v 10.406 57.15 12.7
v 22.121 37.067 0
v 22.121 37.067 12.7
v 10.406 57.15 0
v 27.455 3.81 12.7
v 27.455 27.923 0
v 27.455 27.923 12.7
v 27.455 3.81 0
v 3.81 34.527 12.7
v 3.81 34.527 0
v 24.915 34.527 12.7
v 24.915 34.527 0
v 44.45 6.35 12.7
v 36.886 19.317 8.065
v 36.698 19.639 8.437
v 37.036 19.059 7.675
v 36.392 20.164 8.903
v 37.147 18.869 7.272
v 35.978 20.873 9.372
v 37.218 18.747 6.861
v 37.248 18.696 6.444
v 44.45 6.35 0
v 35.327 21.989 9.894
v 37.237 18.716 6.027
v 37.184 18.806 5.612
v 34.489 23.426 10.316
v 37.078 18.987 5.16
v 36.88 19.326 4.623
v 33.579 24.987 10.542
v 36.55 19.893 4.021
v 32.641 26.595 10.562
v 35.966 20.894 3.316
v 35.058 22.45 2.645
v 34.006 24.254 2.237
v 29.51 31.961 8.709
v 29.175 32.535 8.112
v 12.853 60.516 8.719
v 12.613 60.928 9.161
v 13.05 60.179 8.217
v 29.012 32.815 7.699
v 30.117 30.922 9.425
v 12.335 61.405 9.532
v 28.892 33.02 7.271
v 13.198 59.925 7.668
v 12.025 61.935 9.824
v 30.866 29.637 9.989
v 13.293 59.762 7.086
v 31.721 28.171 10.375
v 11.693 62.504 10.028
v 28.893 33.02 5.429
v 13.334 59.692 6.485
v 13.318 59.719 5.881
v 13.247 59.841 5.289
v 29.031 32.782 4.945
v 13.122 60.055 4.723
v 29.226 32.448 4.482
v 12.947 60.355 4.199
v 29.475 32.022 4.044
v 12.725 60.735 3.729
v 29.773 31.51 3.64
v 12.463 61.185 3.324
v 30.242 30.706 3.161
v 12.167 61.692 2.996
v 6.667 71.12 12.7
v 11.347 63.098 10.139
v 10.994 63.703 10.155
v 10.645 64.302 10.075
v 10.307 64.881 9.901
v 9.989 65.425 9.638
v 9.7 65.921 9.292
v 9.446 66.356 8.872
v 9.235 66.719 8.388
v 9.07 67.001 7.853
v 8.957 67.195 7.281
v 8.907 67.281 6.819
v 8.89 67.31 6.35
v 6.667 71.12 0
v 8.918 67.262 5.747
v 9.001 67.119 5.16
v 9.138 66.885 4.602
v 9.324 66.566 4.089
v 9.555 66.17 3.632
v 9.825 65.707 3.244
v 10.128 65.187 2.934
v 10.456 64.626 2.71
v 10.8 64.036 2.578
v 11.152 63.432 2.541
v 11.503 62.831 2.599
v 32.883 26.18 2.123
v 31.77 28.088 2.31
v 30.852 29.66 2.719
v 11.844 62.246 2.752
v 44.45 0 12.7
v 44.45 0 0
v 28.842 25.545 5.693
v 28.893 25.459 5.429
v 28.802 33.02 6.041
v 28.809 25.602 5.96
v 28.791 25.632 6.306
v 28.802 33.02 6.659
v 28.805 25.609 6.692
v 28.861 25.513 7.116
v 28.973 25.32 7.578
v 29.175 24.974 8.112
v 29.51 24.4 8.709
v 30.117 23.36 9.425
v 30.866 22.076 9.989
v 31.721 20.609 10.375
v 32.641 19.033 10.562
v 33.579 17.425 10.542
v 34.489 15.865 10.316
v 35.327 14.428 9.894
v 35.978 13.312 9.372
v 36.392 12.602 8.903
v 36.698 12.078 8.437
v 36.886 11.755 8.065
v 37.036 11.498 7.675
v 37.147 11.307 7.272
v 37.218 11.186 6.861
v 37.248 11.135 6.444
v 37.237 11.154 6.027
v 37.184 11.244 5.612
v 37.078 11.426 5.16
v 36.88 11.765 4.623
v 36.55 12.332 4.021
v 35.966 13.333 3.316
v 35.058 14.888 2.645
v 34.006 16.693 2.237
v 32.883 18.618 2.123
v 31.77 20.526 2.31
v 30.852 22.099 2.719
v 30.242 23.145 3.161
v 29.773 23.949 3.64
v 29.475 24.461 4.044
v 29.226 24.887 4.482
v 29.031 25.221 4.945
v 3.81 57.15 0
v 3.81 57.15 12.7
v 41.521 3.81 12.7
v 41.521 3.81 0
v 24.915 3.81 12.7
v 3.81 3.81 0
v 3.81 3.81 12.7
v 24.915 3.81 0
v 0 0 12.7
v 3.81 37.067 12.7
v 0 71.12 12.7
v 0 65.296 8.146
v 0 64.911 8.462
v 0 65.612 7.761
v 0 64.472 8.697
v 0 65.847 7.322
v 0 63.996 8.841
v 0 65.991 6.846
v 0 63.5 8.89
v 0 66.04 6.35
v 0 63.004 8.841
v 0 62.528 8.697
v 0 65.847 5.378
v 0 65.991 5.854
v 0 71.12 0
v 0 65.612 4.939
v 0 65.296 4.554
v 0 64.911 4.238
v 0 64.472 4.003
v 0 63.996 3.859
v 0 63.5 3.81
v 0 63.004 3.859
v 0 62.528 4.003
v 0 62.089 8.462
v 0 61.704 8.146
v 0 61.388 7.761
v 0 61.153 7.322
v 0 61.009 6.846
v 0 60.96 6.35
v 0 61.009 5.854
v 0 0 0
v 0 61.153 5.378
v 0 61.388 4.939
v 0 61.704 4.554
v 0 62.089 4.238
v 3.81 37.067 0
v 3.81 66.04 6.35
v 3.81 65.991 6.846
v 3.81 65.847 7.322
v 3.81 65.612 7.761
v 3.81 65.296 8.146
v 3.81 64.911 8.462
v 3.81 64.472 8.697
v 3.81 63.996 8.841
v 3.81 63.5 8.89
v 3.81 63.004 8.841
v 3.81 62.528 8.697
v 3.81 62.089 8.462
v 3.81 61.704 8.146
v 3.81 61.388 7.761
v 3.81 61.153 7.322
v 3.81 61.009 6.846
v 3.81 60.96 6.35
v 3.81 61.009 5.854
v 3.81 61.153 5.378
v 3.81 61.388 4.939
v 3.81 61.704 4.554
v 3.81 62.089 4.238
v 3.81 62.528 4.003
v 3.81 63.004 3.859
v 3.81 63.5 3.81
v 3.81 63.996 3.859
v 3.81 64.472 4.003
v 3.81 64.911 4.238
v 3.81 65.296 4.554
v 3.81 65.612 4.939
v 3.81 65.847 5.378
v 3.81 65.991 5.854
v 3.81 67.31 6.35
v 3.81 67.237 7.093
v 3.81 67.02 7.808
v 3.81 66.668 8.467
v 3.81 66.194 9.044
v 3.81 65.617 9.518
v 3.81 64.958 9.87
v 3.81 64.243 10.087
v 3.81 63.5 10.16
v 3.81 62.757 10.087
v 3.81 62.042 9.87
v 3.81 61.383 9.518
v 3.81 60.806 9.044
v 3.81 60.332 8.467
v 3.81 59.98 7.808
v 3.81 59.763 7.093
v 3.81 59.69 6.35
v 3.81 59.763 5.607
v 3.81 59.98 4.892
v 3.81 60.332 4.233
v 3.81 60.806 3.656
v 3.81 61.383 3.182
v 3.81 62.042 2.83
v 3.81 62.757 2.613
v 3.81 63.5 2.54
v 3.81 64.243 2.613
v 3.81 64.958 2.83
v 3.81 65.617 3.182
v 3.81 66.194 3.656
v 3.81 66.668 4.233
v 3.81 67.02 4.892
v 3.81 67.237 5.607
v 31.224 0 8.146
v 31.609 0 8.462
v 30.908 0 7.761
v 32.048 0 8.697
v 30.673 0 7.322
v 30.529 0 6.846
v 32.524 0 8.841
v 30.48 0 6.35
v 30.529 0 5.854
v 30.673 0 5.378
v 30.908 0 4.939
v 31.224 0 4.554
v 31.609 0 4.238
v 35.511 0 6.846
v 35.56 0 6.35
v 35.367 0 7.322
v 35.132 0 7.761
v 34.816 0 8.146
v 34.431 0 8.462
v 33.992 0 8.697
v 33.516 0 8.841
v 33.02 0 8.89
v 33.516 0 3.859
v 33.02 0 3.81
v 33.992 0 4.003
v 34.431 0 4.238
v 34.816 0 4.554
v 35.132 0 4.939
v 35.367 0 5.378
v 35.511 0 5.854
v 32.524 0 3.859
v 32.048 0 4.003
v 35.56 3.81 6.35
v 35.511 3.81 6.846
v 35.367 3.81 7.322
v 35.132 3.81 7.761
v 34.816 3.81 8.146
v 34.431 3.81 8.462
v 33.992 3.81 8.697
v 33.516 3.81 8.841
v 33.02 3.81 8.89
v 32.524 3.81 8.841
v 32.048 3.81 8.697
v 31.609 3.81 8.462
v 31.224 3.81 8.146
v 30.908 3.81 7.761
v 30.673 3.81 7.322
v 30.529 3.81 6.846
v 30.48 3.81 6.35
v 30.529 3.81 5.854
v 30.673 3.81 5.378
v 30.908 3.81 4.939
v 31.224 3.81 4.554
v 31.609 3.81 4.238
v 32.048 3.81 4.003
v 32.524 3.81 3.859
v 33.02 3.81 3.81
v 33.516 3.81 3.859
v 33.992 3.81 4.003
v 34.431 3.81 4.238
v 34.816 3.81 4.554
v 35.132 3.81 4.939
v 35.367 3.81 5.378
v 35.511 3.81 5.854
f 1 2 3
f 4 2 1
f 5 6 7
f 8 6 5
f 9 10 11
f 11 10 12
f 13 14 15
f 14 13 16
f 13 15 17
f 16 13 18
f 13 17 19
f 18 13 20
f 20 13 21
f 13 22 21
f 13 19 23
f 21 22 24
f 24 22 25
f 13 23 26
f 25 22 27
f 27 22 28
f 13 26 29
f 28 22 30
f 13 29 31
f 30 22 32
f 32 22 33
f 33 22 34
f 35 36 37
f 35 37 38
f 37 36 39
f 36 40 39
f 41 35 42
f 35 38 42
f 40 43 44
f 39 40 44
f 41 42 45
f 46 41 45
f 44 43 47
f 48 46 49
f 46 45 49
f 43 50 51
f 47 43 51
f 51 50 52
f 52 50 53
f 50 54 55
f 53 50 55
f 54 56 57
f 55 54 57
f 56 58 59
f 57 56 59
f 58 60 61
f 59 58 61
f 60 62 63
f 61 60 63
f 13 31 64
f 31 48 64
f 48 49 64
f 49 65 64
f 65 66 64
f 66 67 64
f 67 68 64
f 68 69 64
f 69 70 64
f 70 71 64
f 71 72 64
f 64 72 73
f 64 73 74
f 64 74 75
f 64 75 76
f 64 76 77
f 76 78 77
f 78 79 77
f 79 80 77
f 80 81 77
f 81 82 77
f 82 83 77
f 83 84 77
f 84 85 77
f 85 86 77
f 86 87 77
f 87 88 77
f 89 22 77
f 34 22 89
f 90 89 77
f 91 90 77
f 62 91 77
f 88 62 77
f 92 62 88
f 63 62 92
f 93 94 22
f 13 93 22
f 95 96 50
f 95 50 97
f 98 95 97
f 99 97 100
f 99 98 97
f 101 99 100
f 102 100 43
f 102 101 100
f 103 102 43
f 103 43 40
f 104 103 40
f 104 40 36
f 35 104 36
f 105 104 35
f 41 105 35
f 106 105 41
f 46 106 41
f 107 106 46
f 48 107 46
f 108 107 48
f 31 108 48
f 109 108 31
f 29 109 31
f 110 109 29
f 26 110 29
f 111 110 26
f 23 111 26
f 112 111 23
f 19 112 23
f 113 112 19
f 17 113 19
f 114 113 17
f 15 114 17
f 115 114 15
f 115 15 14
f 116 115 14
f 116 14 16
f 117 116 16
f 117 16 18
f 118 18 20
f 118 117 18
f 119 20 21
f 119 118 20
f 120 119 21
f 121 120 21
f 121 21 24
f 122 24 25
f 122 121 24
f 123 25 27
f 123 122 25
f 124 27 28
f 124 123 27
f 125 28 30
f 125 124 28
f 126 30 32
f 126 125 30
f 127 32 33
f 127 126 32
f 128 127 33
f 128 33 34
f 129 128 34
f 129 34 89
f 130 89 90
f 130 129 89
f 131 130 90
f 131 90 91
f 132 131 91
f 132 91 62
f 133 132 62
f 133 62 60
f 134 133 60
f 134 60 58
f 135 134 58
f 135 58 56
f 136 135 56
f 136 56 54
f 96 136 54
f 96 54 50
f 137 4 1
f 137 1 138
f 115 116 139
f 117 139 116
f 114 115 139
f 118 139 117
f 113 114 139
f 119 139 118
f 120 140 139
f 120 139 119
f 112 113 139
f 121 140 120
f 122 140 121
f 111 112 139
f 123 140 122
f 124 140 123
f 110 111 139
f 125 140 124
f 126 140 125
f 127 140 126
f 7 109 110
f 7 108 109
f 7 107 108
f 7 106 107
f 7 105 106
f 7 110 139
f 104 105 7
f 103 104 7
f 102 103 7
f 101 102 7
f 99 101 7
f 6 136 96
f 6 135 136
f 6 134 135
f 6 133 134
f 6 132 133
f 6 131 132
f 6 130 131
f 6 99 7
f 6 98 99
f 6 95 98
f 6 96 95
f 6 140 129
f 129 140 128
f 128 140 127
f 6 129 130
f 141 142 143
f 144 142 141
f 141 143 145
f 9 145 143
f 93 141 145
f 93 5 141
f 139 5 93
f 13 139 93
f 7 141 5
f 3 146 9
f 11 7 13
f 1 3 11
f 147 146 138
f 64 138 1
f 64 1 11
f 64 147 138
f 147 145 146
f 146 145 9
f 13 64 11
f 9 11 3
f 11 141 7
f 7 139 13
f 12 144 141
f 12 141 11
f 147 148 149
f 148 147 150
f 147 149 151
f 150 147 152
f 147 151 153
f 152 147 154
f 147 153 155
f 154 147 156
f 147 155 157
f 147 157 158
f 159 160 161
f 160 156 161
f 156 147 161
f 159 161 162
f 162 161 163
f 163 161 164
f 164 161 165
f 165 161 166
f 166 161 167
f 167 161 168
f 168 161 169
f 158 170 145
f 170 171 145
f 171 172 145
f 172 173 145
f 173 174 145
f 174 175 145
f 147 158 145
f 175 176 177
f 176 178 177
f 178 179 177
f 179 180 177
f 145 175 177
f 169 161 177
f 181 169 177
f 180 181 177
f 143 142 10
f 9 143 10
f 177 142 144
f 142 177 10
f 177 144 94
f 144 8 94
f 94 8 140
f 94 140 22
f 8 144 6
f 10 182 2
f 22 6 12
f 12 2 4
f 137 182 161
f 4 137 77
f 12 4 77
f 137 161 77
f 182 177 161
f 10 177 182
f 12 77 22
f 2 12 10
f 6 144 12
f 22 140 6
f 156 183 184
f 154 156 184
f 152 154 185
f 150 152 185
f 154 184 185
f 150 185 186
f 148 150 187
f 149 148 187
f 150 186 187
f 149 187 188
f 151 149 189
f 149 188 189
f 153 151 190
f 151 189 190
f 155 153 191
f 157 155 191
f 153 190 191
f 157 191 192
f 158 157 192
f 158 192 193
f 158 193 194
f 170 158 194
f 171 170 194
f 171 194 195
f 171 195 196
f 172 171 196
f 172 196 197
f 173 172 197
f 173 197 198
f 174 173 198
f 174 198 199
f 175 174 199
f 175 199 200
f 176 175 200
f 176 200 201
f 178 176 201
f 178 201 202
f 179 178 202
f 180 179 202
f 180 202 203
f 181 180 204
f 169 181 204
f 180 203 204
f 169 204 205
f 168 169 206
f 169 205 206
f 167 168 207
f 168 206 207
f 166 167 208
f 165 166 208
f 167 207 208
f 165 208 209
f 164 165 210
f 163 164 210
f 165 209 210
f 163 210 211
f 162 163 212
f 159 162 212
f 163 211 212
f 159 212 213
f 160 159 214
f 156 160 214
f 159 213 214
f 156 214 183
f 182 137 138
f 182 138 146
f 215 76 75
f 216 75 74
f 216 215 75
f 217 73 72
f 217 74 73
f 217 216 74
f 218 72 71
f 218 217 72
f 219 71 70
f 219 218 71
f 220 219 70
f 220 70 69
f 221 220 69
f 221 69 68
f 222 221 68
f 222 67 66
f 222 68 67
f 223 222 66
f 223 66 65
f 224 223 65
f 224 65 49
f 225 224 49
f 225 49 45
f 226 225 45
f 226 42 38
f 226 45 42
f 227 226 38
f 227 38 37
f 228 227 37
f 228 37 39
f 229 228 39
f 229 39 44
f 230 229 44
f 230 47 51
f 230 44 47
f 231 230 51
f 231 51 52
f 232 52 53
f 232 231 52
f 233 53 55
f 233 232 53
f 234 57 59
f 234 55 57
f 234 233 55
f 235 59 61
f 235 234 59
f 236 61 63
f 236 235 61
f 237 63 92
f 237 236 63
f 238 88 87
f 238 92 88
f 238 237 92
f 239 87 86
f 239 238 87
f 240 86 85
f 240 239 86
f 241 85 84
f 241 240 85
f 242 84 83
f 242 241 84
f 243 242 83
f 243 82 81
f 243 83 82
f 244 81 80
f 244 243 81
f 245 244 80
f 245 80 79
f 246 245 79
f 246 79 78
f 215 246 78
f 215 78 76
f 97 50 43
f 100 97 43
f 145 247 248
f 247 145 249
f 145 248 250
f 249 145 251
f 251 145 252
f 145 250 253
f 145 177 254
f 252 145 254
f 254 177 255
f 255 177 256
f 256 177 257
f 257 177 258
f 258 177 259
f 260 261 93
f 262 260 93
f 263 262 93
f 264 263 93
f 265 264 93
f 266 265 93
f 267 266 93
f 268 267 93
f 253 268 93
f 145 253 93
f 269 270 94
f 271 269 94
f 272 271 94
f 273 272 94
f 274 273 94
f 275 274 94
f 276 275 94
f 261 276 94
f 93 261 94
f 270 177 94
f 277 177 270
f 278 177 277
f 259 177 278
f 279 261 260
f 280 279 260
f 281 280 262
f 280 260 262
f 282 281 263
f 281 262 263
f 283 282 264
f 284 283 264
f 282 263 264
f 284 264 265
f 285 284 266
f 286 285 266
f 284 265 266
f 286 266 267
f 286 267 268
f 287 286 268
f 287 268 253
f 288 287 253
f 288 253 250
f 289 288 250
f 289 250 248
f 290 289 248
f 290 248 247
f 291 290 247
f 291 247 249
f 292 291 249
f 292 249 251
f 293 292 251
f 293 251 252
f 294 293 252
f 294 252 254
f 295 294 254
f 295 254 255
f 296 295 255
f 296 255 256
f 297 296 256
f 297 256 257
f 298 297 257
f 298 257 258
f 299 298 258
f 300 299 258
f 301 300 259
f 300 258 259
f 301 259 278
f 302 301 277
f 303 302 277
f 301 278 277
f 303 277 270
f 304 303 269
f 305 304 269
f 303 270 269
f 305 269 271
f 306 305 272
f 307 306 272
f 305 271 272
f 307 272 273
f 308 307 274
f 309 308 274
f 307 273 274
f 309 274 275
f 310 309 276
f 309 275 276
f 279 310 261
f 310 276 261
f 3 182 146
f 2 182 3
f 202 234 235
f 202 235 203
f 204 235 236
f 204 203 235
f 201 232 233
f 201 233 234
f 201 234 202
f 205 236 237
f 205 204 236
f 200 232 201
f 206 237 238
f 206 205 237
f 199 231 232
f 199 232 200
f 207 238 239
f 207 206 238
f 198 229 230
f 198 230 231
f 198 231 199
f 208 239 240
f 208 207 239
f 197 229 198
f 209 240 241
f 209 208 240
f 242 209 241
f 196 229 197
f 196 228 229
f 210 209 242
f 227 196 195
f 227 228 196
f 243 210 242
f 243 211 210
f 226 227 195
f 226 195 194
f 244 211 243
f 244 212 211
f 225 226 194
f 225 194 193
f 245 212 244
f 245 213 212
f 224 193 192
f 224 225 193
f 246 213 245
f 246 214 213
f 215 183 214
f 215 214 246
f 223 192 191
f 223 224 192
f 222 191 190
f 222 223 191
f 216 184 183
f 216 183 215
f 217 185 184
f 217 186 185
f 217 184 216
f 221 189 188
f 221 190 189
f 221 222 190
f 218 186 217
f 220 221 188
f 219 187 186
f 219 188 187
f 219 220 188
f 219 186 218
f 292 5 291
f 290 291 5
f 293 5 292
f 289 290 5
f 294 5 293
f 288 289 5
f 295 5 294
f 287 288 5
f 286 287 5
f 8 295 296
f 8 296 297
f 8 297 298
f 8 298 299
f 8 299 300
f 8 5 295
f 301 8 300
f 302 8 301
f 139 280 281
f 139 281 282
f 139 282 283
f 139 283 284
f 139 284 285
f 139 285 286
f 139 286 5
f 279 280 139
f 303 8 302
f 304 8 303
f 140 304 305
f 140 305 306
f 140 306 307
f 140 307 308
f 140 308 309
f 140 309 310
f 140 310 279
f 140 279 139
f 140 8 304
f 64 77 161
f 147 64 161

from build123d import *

# Parameters (mm, degrees)
BOSS_EXTRUDE1_DEPTH     = 12.7
CUT_EXTRUDE1_DEPTH      = 26.162
CUT_EXTRUDE1_DEPTH_BACK = 25.4
SKETCH3_W               = 21.105033739
SKETCH3_H               = 30.717467856
SKETCH4_R               = 2.54
CUT_EXTRUDE2_DEPTH      = 50.8
SKETCH9_R               = 4.2291
CUT_EXTRUDE3_DEPTH      = 29.21
SKETCH11_R              = 3.81
CUT_EXTRUDE4_DEPTH      = 12.7
SKETCH12_R              = 2.54
CUT_EXTRUDE5_DEPTH      = 12.7


with BuildPart() as part:
    # Sketch1 → Boss-Extrude1 (new body)
    with BuildSketch(Plane.XY):
        Polygon((0, 0), (44.45, 0), (44.45, 6.35), (0, 82.55), align=None)
    extrude(amount=BOSS_EXTRUDE1_DEPTH)

    # Sketch3 → Cut-Extrude1 (cut, two sides: drawn at the far end of the back side and taken through both)
    with BuildSketch(Plane.XY.offset(-CUT_EXTRUDE1_DEPTH_BACK)):
        Polygon((3.81, 37.067467856), (22.120626117, 37.067467856), (10.4058157, 57.15), (3.81, 57.15), align=None)
        with Locations((14.36251687, 19.168733928)):
            Rectangle(SKETCH3_W, SKETCH3_H)
        Polygon((27.455033739, 3.81), (41.5208157, 3.81), (27.455033739, 27.922769076), align=None)
        Polygon((6.6675, 71.12), (0, 71.12), (0, 82.55), align=None)
    extrude(amount=CUT_EXTRUDE1_DEPTH + CUT_EXTRUDE1_DEPTH_BACK, mode=Mode.SUBTRACT)

    # Sketch4 → Cut-Extrude2 (cut)
    with BuildSketch(Plane.XZ):
        with Locations((33.02, 6.35)):
            Circle(SKETCH4_R)
    extrude(amount=-CUT_EXTRUDE2_DEPTH, mode=Mode.SUBTRACT)

    # Sketch9 → Cut-Extrude3 (cut)
    with BuildSketch(Plane(origin=(0, 3.81, 0), x_dir=(1, 0, 0), z_dir=(0, 1, 0))):
        with Locations((33.02, -6.35)):
            Circle(SKETCH9_R)
    extrude(amount=CUT_EXTRUDE3_DEPTH, mode=Mode.SUBTRACT)

    # Sketch11 → Cut-Extrude4 (cut)
    with BuildSketch(Plane(origin=(3.81, 0, 0), x_dir=(0, 0, -1), z_dir=(1, 0, 0))):
        with Locations((-6.35, 63.5)):
            Circle(SKETCH11_R)
    extrude(amount=CUT_EXTRUDE4_DEPTH, mode=Mode.SUBTRACT)

    # Sketch12 → Cut-Extrude5 (cut)
    with BuildSketch(Plane(origin=(3.81, 0, 0), x_dir=(0, 0, -1), z_dir=(1, 0, 0))):
        with Locations((-6.35, 63.5)):
            Circle(SKETCH12_R)
    extrude(amount=-CUT_EXTRUDE5_DEPTH, mode=Mode.SUBTRACT)


solid = part.part
